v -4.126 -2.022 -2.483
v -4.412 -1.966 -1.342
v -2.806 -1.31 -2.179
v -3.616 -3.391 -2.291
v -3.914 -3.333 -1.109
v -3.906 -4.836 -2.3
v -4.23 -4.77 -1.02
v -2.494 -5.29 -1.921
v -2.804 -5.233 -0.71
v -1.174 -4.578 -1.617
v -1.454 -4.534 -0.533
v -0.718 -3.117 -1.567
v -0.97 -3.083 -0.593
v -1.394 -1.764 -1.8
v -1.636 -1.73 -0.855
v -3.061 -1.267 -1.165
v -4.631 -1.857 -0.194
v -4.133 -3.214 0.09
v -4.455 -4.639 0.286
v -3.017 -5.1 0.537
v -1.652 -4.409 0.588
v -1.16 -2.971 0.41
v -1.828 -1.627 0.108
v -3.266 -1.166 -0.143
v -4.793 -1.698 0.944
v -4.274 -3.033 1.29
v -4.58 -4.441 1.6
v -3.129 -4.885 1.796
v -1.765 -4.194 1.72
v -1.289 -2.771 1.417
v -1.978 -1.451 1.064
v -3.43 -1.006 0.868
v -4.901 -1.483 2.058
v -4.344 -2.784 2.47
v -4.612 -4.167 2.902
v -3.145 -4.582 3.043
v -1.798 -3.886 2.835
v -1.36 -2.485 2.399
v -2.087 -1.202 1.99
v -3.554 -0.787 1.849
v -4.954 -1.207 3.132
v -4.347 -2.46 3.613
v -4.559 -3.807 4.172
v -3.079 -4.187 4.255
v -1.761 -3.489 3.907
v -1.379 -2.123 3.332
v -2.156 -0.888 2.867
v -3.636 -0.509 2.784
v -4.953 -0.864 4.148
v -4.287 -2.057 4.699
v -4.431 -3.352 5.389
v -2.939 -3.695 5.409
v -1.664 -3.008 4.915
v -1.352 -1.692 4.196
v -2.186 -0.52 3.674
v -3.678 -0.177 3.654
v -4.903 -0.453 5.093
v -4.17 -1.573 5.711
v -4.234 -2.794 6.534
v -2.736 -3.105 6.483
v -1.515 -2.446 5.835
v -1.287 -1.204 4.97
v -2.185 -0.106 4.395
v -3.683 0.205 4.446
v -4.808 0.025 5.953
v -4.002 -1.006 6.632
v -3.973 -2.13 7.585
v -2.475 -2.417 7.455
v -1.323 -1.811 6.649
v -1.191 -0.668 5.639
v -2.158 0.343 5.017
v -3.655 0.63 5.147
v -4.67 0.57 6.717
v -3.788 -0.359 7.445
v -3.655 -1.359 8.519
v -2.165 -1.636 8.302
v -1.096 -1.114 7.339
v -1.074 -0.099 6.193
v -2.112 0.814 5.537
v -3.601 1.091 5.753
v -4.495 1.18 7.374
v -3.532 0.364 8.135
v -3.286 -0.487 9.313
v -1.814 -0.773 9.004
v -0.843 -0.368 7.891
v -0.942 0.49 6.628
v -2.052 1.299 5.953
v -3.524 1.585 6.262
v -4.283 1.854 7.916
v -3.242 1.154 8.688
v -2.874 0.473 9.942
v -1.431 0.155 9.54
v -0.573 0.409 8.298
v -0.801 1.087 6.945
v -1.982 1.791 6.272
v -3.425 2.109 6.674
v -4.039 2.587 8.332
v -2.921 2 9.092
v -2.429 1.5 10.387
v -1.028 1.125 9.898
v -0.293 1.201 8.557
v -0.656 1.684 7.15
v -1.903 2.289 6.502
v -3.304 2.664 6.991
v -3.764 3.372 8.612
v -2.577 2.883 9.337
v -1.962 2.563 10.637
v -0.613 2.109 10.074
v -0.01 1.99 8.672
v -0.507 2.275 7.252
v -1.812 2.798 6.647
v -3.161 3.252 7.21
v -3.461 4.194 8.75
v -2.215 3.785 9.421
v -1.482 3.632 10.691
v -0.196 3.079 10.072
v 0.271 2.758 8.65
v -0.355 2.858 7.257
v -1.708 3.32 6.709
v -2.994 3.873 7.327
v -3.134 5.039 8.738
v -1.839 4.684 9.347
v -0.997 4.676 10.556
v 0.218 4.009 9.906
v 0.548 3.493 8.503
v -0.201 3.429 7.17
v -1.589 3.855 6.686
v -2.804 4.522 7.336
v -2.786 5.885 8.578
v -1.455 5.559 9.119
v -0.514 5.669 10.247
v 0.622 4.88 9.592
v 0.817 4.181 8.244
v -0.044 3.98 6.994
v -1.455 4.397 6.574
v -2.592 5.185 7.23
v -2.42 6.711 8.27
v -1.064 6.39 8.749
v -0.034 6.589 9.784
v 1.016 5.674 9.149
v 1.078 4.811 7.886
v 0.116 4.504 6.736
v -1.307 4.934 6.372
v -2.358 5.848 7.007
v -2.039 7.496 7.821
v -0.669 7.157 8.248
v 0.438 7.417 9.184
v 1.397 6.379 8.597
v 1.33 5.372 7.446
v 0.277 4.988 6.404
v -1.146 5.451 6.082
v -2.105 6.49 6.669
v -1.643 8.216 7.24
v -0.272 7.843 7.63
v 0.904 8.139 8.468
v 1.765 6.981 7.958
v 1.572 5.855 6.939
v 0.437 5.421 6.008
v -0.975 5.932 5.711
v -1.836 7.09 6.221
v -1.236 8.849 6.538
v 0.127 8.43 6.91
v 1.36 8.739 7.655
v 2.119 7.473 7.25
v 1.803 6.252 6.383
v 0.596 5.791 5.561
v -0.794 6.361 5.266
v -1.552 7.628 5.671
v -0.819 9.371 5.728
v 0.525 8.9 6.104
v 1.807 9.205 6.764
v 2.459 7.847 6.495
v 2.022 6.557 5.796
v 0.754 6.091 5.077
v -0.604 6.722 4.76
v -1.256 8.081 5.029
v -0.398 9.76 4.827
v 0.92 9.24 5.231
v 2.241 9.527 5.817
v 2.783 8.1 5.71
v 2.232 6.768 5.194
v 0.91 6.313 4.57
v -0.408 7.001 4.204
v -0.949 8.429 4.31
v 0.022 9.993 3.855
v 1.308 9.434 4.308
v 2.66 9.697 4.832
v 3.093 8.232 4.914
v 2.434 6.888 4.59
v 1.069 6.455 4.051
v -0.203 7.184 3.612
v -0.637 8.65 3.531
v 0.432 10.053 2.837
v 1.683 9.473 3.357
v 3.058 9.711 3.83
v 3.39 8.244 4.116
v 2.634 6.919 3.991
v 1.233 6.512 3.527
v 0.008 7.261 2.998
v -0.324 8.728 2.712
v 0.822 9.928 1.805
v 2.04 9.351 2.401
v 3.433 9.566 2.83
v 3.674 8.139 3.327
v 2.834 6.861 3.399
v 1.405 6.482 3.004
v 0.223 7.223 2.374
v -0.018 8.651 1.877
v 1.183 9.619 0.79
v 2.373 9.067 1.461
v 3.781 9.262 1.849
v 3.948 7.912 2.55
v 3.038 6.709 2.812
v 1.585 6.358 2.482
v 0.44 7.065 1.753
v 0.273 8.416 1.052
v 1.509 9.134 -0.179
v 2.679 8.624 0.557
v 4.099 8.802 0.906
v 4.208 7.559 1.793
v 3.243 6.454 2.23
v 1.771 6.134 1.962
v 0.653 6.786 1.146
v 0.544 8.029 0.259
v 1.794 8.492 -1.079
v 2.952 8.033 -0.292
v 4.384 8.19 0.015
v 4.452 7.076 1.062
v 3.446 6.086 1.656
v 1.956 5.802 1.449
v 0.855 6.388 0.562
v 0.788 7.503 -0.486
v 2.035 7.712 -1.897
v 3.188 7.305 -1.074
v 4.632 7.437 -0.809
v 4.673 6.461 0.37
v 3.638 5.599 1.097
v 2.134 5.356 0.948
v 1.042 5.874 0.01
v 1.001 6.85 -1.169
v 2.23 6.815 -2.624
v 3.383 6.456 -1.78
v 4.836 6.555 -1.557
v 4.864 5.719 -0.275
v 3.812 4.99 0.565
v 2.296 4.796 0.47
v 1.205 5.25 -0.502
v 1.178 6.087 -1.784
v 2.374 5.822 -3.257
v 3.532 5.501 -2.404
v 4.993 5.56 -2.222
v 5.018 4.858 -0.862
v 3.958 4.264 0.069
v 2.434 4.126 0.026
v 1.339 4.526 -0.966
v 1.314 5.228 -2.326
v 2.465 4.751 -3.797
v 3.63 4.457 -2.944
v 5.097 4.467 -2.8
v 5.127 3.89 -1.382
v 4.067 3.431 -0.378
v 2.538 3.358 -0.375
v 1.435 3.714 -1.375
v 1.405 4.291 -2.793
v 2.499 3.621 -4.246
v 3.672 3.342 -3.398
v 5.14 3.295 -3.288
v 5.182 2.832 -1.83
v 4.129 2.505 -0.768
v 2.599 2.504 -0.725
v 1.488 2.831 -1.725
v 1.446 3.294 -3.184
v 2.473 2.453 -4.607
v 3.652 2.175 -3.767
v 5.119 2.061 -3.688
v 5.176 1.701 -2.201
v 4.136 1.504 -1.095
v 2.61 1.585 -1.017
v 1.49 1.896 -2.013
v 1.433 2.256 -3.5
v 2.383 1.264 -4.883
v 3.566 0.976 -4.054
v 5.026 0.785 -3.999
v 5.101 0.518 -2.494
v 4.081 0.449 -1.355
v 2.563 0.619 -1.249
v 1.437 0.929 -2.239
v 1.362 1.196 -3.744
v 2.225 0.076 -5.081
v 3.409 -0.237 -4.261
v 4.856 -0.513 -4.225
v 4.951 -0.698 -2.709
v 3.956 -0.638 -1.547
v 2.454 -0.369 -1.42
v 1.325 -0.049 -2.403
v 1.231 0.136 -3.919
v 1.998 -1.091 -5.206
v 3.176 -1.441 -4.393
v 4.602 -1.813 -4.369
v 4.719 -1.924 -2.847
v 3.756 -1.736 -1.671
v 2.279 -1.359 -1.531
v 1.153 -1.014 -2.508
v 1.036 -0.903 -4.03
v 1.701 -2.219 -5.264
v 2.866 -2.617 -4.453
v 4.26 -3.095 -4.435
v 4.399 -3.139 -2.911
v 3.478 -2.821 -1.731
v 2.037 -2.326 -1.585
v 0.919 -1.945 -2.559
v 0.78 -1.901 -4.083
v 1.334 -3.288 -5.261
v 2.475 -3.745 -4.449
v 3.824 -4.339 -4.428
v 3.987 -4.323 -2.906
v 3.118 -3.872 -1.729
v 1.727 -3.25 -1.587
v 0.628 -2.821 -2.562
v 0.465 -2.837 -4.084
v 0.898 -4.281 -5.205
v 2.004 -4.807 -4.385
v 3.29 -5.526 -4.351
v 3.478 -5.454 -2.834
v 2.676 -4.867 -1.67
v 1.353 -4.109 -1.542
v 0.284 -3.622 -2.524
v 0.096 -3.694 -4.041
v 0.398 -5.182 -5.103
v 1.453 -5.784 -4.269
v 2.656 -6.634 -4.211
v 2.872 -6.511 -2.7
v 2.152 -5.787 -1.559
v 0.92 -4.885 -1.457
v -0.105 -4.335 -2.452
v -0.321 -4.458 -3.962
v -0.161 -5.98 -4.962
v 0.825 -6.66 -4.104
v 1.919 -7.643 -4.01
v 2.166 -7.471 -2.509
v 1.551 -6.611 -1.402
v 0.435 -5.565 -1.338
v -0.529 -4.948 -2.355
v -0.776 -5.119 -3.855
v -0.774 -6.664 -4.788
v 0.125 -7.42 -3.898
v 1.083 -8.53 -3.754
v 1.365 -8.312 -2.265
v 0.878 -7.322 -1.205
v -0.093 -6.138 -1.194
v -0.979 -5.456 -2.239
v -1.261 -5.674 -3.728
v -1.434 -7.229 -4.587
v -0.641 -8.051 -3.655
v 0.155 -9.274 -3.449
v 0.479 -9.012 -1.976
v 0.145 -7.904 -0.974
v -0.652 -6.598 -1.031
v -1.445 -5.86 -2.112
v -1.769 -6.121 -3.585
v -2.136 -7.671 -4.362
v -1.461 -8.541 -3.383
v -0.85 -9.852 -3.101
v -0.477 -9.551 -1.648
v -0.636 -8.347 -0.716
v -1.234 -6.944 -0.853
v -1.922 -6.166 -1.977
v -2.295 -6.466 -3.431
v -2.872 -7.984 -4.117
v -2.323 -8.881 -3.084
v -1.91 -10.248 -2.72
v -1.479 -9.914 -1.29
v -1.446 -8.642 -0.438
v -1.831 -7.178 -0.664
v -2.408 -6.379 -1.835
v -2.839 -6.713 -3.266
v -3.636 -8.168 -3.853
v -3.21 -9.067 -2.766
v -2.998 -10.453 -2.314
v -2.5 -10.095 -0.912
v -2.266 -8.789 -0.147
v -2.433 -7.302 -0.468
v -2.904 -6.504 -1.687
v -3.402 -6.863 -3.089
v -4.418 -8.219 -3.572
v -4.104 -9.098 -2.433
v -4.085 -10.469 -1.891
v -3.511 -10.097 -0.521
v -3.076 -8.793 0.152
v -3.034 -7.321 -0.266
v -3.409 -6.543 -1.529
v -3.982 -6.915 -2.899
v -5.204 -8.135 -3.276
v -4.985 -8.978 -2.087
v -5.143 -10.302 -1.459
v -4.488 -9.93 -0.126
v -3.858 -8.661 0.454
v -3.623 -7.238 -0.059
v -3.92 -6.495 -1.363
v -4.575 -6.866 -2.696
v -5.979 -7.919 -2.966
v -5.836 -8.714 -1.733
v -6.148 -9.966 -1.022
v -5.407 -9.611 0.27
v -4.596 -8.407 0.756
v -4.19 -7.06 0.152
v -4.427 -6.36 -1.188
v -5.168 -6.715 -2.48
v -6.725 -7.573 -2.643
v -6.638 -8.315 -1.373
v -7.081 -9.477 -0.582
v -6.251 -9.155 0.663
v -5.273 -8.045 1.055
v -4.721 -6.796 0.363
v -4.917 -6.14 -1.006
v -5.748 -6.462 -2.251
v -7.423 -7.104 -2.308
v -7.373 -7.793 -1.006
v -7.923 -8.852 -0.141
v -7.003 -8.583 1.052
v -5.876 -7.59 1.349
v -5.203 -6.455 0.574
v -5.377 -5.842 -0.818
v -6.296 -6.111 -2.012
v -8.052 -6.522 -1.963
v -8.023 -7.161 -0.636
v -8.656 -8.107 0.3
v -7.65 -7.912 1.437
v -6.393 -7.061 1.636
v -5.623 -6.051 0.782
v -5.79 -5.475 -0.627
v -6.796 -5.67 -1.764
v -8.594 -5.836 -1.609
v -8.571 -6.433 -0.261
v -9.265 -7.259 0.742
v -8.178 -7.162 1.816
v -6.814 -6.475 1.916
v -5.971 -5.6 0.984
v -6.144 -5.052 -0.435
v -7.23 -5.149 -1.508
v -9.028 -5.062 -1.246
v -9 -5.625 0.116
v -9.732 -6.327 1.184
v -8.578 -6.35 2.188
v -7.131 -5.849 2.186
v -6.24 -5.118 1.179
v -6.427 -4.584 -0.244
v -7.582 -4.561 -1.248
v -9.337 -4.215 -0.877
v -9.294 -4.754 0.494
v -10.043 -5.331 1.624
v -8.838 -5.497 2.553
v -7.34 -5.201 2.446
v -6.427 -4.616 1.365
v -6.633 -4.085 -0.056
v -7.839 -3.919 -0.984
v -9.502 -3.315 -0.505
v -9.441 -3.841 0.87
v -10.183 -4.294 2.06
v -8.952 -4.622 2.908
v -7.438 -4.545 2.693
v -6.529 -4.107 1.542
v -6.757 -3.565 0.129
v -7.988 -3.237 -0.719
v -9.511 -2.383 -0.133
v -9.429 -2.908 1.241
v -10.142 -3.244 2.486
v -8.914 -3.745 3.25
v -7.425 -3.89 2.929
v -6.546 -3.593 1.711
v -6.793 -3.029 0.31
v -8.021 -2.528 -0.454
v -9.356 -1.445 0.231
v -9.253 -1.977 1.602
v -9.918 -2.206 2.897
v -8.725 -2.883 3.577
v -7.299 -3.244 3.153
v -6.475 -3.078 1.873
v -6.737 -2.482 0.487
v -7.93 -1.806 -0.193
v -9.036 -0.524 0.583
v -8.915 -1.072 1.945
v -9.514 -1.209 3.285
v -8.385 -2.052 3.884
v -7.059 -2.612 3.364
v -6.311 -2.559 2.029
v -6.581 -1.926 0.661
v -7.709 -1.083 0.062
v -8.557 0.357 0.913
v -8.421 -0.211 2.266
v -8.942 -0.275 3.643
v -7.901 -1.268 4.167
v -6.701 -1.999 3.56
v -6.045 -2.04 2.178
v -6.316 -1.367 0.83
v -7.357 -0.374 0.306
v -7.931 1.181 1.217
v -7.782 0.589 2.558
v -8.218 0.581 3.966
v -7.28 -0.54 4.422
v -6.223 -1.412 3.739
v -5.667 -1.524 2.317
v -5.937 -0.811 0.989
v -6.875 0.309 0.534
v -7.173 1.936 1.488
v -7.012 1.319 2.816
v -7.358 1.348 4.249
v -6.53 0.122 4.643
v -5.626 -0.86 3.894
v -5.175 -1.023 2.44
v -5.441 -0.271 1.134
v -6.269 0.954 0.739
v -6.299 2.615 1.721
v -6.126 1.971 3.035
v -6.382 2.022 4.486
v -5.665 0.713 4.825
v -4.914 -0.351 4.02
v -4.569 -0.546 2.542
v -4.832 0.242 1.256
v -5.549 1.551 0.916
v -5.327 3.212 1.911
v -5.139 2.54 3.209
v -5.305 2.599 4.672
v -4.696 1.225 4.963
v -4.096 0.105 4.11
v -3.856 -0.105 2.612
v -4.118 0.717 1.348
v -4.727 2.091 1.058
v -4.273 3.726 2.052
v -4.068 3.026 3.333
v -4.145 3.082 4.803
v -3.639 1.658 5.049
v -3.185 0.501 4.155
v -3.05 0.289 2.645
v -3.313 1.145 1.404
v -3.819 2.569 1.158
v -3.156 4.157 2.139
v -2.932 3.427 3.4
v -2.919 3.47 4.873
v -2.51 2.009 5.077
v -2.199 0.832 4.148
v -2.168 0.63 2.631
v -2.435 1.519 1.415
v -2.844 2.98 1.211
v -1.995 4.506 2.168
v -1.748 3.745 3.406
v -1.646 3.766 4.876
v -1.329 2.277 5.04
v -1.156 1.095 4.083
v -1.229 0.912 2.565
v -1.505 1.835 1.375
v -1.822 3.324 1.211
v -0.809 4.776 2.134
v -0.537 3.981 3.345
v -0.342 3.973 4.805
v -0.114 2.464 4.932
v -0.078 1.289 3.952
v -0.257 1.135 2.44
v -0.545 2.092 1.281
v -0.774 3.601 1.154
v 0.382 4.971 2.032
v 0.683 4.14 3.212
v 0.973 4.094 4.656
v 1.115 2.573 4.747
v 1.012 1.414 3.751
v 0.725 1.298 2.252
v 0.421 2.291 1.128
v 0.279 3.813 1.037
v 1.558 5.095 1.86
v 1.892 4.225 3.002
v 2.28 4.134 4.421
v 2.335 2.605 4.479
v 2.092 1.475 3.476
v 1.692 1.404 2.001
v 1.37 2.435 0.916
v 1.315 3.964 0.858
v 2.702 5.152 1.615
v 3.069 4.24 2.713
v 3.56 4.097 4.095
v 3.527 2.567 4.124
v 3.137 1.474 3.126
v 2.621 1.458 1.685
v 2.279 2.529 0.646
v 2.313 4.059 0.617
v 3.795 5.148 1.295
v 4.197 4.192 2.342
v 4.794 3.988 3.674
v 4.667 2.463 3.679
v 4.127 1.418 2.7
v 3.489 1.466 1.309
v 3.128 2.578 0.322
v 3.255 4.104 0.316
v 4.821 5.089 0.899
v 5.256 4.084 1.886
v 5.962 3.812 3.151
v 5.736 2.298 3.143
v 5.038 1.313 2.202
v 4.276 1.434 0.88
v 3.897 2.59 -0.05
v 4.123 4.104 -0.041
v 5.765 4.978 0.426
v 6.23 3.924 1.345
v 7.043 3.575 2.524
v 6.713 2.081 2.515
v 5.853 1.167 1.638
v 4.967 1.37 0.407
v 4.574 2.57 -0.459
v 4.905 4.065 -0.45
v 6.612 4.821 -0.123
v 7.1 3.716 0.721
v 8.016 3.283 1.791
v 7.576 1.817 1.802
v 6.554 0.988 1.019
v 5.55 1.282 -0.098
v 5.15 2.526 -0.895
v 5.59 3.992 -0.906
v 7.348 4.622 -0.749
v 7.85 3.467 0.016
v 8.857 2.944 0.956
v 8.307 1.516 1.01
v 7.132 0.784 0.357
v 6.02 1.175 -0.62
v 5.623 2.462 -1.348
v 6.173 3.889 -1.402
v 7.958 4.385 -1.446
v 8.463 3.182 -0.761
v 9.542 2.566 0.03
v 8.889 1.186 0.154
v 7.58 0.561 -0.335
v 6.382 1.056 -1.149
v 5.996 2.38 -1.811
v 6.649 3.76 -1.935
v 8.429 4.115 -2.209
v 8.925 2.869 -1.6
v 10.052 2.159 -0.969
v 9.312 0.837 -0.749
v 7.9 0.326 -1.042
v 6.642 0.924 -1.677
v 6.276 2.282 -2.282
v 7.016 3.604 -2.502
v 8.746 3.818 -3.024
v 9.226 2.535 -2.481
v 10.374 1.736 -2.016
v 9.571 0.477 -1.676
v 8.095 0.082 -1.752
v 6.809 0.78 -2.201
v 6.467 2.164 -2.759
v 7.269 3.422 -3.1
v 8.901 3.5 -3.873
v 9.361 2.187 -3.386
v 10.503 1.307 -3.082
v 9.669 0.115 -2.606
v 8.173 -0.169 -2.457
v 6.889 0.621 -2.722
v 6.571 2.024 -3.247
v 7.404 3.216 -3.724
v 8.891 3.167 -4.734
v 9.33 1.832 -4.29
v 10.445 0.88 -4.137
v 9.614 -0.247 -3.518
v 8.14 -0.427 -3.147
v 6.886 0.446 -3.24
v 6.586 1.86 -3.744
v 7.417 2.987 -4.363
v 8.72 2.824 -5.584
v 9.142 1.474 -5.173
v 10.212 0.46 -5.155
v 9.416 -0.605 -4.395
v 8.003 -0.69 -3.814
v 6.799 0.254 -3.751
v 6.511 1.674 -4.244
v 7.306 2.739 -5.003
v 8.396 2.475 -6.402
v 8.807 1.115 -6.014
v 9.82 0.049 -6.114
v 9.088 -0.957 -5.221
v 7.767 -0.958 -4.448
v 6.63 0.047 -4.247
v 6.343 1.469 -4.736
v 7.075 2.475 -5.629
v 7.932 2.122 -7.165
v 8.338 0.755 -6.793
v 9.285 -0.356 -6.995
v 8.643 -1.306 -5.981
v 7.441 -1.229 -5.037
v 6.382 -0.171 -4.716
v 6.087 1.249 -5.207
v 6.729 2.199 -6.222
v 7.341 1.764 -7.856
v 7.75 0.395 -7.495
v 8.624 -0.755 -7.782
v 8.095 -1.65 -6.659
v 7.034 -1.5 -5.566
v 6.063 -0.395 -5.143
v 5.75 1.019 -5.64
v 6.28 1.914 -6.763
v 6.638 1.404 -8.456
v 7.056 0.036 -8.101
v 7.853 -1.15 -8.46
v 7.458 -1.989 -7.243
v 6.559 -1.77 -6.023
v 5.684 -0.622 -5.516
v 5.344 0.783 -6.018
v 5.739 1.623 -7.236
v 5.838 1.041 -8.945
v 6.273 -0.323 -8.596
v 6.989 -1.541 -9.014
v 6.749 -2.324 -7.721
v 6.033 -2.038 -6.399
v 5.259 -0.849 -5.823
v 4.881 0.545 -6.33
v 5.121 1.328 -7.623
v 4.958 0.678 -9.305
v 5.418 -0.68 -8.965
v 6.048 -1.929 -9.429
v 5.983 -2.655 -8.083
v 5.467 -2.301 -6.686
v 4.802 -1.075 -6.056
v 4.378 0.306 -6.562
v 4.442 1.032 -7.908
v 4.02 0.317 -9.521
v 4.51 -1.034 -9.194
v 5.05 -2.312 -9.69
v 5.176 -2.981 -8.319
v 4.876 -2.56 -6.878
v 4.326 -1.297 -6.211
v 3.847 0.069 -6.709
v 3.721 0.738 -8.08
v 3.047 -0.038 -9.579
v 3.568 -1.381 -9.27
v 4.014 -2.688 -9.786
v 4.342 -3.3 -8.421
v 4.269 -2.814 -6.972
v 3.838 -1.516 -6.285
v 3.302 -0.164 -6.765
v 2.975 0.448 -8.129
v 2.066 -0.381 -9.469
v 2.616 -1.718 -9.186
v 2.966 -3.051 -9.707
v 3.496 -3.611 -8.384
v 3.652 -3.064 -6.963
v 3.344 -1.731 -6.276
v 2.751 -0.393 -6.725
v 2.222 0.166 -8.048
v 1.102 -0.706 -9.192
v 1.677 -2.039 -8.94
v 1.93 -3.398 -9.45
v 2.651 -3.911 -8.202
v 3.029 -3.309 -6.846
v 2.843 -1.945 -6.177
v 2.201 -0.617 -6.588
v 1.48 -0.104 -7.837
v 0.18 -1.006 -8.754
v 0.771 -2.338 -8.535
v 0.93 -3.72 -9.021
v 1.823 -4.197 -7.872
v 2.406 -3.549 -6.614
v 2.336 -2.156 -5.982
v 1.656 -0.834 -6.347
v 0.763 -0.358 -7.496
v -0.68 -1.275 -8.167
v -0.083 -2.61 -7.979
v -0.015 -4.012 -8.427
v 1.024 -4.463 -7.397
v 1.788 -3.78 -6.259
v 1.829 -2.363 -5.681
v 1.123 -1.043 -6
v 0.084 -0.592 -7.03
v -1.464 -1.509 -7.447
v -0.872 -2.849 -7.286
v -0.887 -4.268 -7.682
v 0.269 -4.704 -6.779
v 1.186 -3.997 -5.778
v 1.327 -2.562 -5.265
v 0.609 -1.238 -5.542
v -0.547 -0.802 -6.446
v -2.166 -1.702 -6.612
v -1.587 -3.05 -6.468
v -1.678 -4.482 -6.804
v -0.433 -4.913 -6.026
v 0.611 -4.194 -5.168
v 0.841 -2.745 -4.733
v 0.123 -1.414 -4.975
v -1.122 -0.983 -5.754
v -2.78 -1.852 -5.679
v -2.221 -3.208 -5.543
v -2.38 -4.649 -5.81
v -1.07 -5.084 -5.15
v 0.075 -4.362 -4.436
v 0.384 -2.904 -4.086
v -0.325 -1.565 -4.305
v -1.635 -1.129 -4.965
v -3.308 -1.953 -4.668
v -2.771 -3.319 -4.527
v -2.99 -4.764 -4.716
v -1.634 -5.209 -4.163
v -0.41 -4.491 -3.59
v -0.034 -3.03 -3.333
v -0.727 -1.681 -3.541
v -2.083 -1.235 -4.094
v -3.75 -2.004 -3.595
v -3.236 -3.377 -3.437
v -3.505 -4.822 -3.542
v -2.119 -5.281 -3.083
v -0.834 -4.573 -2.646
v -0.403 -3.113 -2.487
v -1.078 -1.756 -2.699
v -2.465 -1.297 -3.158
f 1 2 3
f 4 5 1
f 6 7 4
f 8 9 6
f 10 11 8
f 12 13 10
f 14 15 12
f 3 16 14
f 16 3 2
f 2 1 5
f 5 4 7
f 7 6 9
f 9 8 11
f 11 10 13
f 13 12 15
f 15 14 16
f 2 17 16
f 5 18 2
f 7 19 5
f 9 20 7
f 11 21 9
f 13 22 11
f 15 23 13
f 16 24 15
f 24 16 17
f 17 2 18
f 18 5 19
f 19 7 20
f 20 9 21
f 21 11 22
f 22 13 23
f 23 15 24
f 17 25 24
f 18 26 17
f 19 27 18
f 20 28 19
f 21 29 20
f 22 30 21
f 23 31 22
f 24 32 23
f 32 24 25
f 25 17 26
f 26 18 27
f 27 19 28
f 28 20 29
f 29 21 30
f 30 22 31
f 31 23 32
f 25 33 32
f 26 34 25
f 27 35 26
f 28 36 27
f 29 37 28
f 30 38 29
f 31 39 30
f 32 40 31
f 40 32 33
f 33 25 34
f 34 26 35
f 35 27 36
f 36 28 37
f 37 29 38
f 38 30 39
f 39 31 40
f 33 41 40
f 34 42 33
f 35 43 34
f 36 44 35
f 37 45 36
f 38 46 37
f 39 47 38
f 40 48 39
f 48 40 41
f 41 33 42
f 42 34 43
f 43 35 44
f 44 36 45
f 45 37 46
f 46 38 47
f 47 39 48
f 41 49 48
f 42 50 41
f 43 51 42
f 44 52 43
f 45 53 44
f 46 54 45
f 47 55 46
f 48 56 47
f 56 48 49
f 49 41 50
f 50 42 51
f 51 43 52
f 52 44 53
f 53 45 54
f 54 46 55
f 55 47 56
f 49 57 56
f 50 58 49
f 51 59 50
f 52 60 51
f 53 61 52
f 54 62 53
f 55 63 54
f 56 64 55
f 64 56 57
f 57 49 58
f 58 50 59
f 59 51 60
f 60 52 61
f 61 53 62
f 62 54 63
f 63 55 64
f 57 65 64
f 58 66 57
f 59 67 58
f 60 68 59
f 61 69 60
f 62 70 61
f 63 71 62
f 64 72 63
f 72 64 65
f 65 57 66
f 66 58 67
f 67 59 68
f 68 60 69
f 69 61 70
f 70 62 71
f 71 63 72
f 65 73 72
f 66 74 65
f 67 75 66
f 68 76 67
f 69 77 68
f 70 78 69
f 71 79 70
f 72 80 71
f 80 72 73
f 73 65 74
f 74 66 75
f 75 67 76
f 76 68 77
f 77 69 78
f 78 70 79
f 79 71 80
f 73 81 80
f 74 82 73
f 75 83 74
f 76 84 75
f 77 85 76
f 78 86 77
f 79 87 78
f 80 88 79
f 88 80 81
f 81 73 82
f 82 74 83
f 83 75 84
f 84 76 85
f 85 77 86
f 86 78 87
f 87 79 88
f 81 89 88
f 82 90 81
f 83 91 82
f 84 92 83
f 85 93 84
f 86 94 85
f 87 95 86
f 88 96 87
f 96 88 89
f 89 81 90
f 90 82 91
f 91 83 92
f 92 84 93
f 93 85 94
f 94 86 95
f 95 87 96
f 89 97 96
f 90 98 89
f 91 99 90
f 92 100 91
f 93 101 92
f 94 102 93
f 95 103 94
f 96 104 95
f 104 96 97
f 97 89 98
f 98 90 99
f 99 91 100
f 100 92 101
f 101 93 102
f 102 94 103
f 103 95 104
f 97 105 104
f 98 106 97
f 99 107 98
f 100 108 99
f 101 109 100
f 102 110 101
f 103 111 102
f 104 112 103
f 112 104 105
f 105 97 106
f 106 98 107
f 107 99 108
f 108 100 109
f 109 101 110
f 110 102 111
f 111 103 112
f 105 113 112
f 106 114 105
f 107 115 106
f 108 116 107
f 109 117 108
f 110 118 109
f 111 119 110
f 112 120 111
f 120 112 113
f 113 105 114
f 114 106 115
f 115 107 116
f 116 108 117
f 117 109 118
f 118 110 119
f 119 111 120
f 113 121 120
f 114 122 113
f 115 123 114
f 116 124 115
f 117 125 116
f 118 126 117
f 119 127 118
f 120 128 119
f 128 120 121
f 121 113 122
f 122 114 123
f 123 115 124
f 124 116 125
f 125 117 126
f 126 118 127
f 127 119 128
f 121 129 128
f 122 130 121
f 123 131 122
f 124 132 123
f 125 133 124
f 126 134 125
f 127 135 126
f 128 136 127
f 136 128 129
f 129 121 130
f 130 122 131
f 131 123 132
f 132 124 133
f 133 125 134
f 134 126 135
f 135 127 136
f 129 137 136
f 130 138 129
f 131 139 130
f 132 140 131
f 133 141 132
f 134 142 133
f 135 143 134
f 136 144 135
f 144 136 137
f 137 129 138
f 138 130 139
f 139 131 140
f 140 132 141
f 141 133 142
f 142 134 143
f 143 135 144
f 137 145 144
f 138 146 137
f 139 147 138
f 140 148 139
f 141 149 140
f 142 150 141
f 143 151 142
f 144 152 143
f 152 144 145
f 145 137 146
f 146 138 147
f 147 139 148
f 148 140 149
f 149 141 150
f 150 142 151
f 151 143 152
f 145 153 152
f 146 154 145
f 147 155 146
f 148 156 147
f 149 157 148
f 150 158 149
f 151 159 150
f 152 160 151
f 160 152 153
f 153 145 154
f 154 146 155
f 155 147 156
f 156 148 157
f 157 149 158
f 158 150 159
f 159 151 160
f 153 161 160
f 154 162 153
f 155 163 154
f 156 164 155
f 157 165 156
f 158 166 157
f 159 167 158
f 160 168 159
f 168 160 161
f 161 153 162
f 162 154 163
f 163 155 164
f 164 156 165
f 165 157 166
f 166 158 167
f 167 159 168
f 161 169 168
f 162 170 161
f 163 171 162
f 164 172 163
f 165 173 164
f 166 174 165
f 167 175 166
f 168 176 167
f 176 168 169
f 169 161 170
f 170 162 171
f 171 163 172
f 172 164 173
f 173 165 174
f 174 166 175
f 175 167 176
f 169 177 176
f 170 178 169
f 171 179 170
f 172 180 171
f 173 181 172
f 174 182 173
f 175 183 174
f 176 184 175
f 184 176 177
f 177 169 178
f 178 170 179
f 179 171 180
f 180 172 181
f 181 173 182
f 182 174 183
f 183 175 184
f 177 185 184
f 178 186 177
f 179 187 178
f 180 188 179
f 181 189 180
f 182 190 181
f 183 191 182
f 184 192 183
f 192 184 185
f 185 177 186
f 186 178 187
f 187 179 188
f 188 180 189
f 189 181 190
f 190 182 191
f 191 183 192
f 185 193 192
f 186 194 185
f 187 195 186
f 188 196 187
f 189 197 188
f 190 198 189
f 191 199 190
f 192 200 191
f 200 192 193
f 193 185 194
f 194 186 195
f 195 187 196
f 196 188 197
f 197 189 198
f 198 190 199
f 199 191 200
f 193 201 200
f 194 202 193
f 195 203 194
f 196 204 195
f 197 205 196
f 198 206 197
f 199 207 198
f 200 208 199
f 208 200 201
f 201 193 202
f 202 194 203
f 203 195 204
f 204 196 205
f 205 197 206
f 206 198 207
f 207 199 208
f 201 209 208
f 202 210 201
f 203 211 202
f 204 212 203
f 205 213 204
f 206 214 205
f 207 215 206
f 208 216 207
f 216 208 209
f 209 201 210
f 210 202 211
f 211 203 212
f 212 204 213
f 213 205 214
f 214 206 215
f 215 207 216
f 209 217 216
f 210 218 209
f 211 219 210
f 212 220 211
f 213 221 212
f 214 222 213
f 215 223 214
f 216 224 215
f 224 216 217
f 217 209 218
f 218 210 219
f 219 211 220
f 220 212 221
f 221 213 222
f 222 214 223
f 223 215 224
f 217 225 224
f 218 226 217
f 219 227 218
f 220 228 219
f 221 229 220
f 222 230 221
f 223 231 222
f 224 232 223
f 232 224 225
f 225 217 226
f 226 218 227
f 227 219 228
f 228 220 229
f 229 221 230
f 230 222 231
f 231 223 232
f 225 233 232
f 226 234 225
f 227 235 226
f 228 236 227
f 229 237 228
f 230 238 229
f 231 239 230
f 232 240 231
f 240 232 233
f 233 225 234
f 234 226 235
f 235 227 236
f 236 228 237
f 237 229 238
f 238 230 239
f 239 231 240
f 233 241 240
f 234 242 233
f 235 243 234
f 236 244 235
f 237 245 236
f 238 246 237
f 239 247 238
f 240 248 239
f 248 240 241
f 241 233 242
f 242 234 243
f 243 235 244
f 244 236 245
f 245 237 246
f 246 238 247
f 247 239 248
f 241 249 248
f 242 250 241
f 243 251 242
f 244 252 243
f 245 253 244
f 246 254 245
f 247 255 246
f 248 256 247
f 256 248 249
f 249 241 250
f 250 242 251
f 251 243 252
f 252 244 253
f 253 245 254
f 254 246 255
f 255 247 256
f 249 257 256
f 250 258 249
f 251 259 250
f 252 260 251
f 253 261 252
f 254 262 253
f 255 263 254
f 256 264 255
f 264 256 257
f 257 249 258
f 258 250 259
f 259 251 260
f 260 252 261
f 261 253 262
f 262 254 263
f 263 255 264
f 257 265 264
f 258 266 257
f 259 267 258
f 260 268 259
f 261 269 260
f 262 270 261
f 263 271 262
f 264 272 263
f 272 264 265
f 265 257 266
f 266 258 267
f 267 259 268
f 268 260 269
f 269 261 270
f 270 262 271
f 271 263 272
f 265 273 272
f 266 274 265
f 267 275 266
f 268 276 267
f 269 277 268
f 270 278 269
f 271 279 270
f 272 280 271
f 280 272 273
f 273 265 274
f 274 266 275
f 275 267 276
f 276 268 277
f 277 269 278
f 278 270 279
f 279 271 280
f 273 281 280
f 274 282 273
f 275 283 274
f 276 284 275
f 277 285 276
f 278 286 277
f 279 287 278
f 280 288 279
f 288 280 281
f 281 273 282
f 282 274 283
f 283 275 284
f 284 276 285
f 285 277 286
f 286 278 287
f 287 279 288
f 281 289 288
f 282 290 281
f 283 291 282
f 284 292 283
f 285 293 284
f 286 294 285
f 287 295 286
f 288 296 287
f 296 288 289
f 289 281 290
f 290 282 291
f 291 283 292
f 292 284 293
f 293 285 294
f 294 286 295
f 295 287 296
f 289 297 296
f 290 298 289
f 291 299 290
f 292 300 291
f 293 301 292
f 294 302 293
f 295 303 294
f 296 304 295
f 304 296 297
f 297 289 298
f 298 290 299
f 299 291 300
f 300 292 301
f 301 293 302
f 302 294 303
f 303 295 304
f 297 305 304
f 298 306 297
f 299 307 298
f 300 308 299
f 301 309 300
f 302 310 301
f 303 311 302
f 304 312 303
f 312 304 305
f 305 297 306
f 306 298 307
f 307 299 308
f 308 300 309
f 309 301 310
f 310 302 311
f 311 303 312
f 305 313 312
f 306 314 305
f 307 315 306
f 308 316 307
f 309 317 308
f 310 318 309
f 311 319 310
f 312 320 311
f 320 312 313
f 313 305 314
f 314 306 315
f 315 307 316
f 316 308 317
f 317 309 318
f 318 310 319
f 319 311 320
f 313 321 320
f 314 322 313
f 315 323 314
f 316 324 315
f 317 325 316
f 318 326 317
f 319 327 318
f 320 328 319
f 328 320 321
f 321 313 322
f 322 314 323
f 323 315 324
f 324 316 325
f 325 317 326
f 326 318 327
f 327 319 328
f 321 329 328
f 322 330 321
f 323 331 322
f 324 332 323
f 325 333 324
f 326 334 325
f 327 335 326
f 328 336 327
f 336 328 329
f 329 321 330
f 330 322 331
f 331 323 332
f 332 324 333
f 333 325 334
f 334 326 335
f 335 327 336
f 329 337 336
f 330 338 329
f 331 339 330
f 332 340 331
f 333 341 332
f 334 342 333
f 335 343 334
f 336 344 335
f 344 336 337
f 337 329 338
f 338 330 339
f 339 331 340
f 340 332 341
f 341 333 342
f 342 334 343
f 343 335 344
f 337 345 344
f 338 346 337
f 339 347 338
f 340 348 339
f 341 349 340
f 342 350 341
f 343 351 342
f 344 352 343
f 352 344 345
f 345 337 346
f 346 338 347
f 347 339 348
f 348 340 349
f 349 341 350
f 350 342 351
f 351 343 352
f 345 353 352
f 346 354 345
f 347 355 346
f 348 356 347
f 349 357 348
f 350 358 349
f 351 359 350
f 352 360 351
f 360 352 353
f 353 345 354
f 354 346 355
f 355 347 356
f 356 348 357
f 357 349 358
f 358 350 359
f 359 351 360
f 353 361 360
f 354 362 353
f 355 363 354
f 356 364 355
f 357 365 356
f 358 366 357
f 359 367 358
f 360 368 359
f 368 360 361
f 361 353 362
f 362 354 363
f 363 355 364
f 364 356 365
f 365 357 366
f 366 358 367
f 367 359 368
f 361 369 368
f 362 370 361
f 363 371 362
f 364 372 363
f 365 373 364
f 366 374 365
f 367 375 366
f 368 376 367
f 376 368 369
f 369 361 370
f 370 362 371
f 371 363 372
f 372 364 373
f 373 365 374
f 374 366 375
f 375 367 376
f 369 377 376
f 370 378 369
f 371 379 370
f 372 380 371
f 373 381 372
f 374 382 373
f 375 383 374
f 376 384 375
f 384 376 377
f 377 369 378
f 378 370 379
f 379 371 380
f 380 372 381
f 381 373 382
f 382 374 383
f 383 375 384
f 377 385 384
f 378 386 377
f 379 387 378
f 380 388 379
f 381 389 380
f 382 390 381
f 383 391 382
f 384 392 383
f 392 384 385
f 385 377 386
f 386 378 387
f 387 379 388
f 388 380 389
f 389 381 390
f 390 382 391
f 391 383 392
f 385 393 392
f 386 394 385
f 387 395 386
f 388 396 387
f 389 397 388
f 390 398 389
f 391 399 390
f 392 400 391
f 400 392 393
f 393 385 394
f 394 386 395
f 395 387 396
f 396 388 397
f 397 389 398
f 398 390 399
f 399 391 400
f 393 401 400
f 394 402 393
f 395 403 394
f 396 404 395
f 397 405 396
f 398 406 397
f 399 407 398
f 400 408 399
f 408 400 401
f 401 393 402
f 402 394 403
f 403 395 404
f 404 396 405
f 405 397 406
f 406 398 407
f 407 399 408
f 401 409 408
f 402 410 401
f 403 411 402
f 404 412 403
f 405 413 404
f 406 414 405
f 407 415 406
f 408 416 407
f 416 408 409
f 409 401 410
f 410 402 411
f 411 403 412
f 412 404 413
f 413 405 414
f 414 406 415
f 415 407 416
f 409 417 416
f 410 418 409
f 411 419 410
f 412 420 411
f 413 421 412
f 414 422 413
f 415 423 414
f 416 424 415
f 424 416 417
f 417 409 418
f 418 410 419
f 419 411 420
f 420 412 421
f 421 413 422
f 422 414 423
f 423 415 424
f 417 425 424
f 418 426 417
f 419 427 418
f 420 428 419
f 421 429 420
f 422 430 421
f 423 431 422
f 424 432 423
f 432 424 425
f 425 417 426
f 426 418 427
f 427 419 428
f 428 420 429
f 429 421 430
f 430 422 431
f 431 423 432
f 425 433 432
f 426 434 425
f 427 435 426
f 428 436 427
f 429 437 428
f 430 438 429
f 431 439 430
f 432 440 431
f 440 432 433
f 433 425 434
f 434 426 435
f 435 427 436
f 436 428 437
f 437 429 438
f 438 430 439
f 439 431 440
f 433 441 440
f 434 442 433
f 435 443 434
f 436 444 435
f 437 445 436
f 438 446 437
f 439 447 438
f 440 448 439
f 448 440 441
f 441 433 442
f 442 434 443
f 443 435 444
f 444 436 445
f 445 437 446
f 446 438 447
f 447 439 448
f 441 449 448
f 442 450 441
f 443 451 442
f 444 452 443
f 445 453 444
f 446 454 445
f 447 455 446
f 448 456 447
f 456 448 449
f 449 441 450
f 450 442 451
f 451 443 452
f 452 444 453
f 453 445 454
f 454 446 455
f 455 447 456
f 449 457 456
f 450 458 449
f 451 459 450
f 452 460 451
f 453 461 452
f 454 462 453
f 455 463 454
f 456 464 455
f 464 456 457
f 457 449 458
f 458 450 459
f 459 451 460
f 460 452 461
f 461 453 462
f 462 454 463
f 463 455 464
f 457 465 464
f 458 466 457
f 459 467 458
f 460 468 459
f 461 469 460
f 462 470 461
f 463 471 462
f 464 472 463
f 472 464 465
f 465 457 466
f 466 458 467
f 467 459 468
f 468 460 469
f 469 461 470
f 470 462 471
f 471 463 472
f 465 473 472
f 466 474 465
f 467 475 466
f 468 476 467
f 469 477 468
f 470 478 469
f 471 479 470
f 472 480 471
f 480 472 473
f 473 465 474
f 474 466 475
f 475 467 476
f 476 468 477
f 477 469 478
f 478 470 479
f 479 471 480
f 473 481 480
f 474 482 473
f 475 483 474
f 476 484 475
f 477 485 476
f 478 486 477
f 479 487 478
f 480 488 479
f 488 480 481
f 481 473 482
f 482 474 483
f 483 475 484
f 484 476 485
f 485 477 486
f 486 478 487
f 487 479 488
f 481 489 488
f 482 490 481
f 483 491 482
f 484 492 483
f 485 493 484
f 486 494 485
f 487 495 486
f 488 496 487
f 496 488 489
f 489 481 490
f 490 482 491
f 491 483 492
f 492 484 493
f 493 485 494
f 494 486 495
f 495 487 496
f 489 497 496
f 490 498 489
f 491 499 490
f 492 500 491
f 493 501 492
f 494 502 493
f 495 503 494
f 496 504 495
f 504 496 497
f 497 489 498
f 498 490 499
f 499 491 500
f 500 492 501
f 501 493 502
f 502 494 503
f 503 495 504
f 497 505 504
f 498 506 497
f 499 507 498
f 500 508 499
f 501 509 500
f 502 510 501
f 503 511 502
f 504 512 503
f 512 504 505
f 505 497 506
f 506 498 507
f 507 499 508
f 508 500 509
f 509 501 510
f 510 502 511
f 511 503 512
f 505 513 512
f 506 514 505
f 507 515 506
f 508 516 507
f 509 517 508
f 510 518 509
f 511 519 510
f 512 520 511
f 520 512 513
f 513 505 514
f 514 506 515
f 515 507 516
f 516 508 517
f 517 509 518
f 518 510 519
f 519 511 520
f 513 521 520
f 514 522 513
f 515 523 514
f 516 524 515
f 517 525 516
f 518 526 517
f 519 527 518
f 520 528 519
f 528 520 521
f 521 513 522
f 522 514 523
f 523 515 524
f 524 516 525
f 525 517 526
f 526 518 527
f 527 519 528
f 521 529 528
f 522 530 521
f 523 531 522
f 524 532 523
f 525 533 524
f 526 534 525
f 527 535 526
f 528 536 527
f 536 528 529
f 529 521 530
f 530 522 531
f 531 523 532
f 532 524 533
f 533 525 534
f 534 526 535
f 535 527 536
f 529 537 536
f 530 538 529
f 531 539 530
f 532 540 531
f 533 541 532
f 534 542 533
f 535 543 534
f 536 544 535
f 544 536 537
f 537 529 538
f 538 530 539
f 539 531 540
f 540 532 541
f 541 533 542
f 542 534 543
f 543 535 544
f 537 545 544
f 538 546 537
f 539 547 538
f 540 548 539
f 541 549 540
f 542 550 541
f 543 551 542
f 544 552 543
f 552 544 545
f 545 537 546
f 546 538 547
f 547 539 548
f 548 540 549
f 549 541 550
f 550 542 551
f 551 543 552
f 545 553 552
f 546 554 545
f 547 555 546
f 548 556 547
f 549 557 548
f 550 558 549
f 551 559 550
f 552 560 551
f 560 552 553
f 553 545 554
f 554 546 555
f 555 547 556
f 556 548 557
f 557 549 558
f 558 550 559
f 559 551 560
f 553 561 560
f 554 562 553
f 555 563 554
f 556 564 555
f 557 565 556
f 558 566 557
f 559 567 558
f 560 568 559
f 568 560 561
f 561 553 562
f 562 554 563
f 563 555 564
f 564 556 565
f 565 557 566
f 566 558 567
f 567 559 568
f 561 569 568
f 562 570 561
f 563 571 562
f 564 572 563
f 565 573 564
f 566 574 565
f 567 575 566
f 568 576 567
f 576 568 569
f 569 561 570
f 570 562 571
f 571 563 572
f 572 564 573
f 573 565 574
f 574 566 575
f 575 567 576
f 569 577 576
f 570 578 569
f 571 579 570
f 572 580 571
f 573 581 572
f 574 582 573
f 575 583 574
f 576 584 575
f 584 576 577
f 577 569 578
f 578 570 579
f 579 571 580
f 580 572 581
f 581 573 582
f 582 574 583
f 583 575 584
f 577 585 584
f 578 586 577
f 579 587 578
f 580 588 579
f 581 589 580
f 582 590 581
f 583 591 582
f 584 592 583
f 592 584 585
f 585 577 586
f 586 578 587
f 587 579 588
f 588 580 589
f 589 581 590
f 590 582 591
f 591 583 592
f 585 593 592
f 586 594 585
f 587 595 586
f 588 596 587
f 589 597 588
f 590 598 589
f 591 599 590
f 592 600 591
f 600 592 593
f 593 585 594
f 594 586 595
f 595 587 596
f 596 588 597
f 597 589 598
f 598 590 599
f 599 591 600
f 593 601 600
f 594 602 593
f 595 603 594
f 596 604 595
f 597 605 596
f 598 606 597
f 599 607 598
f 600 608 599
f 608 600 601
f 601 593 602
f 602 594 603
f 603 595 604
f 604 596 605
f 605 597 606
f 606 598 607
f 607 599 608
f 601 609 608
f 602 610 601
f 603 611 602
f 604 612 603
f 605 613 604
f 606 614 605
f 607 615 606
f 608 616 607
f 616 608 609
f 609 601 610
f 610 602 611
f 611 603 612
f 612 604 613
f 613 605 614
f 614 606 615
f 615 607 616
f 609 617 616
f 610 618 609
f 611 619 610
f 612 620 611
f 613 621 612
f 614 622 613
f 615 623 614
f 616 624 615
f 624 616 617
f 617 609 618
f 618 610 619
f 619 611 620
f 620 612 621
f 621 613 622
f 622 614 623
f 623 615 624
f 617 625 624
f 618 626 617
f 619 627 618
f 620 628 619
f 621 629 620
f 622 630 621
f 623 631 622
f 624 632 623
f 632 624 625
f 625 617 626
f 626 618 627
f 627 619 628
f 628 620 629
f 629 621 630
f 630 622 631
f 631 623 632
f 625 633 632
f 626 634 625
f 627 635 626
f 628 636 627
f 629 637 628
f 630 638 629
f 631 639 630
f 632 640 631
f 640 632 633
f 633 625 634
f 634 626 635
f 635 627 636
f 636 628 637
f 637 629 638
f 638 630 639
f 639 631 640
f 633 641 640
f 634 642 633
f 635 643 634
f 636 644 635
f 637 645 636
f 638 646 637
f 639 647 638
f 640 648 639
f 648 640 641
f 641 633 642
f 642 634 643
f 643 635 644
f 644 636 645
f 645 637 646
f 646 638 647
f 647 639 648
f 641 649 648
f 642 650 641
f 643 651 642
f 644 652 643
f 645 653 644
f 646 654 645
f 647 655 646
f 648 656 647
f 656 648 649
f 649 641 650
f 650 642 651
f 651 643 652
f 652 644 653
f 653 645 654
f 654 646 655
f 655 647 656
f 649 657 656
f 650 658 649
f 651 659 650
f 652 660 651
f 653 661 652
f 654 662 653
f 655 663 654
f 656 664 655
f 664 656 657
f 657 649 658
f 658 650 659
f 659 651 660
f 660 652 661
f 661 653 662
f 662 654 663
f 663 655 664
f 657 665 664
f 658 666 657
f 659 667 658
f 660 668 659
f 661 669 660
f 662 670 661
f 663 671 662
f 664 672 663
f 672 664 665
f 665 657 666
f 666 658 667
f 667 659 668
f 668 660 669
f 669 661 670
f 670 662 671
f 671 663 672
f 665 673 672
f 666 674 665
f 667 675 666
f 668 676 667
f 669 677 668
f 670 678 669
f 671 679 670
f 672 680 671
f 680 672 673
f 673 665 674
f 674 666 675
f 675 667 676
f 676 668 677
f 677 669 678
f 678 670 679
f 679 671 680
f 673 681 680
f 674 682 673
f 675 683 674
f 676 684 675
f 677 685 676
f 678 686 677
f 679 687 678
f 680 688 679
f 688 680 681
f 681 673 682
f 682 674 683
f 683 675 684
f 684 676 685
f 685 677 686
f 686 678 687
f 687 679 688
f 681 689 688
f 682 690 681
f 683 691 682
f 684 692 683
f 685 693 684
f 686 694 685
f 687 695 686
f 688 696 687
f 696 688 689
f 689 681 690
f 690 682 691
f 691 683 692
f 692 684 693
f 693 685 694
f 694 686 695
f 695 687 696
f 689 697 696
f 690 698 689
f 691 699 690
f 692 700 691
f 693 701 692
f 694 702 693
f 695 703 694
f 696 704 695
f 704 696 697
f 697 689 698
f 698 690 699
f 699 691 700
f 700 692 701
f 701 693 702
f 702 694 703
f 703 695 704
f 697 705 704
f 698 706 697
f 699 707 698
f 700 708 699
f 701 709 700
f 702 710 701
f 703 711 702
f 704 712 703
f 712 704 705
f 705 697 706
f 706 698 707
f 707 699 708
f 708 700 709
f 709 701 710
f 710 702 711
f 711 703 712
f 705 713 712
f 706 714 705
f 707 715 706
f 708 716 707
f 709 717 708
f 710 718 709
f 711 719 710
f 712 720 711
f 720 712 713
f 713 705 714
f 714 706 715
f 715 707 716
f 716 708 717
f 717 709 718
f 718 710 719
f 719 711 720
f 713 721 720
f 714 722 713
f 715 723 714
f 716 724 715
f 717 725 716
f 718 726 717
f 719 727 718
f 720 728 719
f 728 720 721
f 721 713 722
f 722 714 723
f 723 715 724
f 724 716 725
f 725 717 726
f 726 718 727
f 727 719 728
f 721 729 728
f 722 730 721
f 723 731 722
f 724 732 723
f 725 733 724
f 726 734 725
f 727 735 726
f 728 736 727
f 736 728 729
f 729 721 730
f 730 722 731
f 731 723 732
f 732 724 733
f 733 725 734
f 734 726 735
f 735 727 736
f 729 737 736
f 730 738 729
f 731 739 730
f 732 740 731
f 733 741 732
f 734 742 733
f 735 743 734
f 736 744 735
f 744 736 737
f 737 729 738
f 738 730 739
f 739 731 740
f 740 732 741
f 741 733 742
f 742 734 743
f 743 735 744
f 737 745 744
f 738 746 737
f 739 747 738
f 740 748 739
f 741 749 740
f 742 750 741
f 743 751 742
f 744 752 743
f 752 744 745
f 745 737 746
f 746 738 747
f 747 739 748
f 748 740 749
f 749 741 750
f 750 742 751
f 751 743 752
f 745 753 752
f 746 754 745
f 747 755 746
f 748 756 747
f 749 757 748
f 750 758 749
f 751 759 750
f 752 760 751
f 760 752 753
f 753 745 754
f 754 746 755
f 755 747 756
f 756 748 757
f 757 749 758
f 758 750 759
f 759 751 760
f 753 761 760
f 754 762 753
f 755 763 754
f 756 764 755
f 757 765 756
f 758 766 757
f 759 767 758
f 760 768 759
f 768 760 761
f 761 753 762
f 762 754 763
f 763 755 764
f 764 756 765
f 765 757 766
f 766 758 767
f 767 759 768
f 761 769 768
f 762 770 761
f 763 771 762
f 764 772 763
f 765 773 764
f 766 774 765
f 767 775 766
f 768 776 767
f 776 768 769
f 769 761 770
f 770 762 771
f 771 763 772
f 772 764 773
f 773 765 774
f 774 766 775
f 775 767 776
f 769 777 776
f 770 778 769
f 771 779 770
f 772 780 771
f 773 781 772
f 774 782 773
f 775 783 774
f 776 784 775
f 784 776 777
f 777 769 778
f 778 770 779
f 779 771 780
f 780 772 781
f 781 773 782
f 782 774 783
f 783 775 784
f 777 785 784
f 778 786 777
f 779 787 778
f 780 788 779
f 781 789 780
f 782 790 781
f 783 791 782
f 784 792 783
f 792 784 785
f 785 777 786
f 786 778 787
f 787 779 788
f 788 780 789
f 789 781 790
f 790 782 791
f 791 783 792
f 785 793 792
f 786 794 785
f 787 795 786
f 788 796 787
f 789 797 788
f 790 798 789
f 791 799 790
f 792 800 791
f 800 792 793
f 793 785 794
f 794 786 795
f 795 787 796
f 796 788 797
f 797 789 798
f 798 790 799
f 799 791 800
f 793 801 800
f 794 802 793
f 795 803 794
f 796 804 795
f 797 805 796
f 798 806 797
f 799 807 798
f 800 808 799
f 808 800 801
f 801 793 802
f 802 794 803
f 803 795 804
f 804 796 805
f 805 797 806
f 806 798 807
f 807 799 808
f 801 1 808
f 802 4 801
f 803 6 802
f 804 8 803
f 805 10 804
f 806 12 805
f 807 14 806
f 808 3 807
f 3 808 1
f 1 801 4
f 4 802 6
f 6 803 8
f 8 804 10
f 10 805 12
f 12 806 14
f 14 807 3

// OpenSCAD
//  path_extrude.scad -- Extrude a path in 3D space
//  usage: add "use <path_extrude.scad>;" to the top of your OpenSCAD source code

//  Copyright (C) 2014-2019  David Eccles (gringer) <bioinformatics@gringene.org>

//  This program is free software: you can redistribute it and/or modify
//  it under the terms of the GNU General Public License as published by
//  the Free Software Foundation, either version 3 of the License, or
//  (at your option) any later version.

//  This program is distributed in the hope that it will be useful,
//  but WITHOUT ANY WARRANTY; without even the implied warranty of
//  MERCHANTABILITY or FITNESS FOR A PARTICULAR PURPOSE.  See the
//  GNU General Public License for more details.

//  You should have received a copy of the GNU General Public License
//  along with this program.  If not, see <https://www.gnu.org/licenses/>.

// Determine the projection of a point on a plane centered at c1 with normal n1
function project(p, c, n) =
    p - (n * (p - c)) * n / (n * n);

// determine angle between two points with a given normal orientation
// see https://stackoverflow.com/questions/14066933/
//        direct-way-of-computing-clockwise-angle-between-2-vectors
//    dot = p1 * p2;
//    det = (p1[0]*p2[1]*n1[2] + p2[0]*n1[1]*p1[2] + n1[0]*p1[1]*p2[2]) -
//          (n1[0]*p2[1]*p1[2] + p1[0]*n1[1]*p2[2] + p2[0]*p1[1]*n1[2]);
//    atan2(det, dot);
// determine angle between two planar points and a centre
// with a given normal orientation
function getPlanarAngle(p1, p2, c1, n1) =
    let(p1 = p1-c1, n1=n1 / norm(n1), p2=p2-c1)
    atan2((p1[0]*p2[1]*n1[2] + p2[0]*n1[1]*p1[2] + n1[0]*p1[1]*p2[2]) -
          (n1[0]*p2[1]*p1[2] + p1[0]*n1[1]*p2[2] + p2[0]*p1[1]*n1[2]), p1 * p2);

function c3D(tPoints) =
    (len(tPoints[0]) == undef) ? // single point
        c3D([tPoints])[0] :
        (len(tPoints[0]) < 3) ?  // collection of 2D points
            tPoints * [[1,0,0],[0,1,0]] :
            tPoints;             // 3D points

// translate a point (or points)
function myTranslate(ofs, points, acc = []) =
    (len(points[0]) == undef) ?
        myTranslate(ofs, [points])[0] :
        [ for(i = [0:(len(points) - 1)])
          [ for(d = [0:(len(points[0])-1)]) (ofs[d] + points[i][d])]];

// rotate a point (or points)
function myRotate(rotVec, points) =
    let(rotX = [[1,              0,               0],
                [0, cos(rotVec[0]), -sin(rotVec[0])],
                [0, sin(rotVec[0]),  cos(rotVec[0])]],
        rotY = [[ cos(rotVec[1]), 0,-sin(rotVec[1])],
                [              0, 1,              0],
                [ sin(rotVec[1]), 0, cos(rotVec[1])]],
        rotZ = [[ cos(rotVec[2]), sin(rotVec[2]), 0],
                [ sin(rotVec[2]), -cos(rotVec[2]), 0],
                [0,              0,               1]])
    (len(points[0]) == undef) ?
        myRotate(rotVec, [points])[0] :
        c3D(points) * rotX * rotY * rotZ;

// Determine spherical rotation for cartesian coordinates
function rToS(pt) =
    [-acos((pt[2]) / norm(pt)),
         0,
         -atan2(pt[0],pt[1])];

function calcPreRot(p1, p2, p3) =
  let(n1=p2-p1, // normal between the two points (i.e. the plane that the polygon sits on)
      n2=p3-p2,
      rt1=rToS(n1),
      rt2=rToS(n2),
      pj1=(p2 + myRotate(rt2, [[2,0,0.5]])[0]),
      pj2=project(p=(p1 + myRotate(rt1, [[2,0,0.5]])[0]), c=p2, n=n2))
  getPlanarAngle(p1=pj1, p2=pj2, c1=p2, n1=n2);

function cumSum(x, res=[]) =
  (len(x) == len(res)) ? concat([0], res) :
    (len(res) == 0) ? cumSum(x=x, res=[x[0]]) :
        cumSum(x=x, res=concat(res, [x[len(res)] + res[len(res)-1]]));

// Create extrusion side panels for one polygon segment as triangles.
// Note: panels are not necessarily be planar due to path twists
function makeSides(shs, pts, ofs=0) =
  concat(
    [for(i=[0:(shs-1)]) [i+ofs, ((i+1) % shs + ofs + shs) % (shs * pts),
                         (i+1) % shs + ofs]],
    [for(i=[0:(shs-1)]) [((i+1) % shs + ofs + shs) % (shs * pts),
                         i+ofs, (i + ofs + shs) % (shs * pts)]]);

// Concatenate the contents of the outermost list
function flatten(A, acc = [], aDone = 0) =
    (aDone >= len(A)) ? acc :
       flatten(A, acc=concat(acc, A[aDone]), aDone = aDone + 1);

// Linearly interpolate between two shapes
function makeTween(shape1, shape2, t) =
    (t == 0) ? shape1 :
      (t == 1) ? shape2 :
        [for (i=[0:(len(shape1)-1)])
          (shape1[i]*(1-t) + shape2[i % len(shape2)]*(t))];

// Extrude a 2D shape through a 3D path
// Note: merge has two effects:
//   1) Removes end caps
//   2) Adjusts the rotation of each path point
//      so that the end and start match up
module path_extrude(exPath, exShape, exShape2=[],
    exRots = [0], exScale = [1], merge=false){
  echo(len(exShape2));
  exShapeTween = (len(exShape2) == 0) ?
    exShape : exShape2;
  shs = len(exShape); // shs: shape size
  pts = len(exPath);  // pts: path size
  exPathX = (merge) ? concat(exPath, [exPath[0], exPath[1]]) :
      concat(exPath,
            [exPath[pts-1] + (exPath[pts-1] - exPath[pts-2]),
             exPath[pts-1] + 2*(exPath[pts-1] - exPath[pts-2])]);
  exScaleX = (len(exScale) == len(exPath)) ? exScale :
      [for (i = [0:(pts-1)]) exScale[i % len(exScale)]];
  preRots = [for(i = [0:(pts-1)])
    calcPreRot(p1=exPathX[i], // "current" point on the path
               p2=exPathX[(i+1)], // "next" point on the path
               p3=exPathX[(i+2)]) ];
  cumPreRots = cumSum(preRots);
  seDiff = cumPreRots[len(cumPreRots)-1]; // rotation difference (start - end)
  // rotation adjustment to get start to look like end
  seAdj = -seDiff / (len(cumPreRots));
  adjPreRots = (!merge) ? cumPreRots :
    [for(i = [0:(pts-1)]) (cumPreRots[i] + seAdj * i)];
  adjExRots = (len(exRots) == 1) ?
    [for(i = [0:(len(adjPreRots)-1)]) (adjPreRots[i] + exRots[0])] :
    [for(i = [0:(len(adjPreRots)-1)]) (adjPreRots[i] + exRots[i % len(exRots)])];
  phPoints = flatten([
    for(i = [0:(pts-1)])
      let(p1=exPathX[i],
          p2=exPathX[(i+1)],
          n1=p2-p1, // normal between the two points
          rt1=rToS(n1))
      myTranslate(p1, myRotate(rt1, myRotate([0,0,-adjExRots[i]],
                  c3D(makeTween(exShape, exShapeTween, i / (pts-1)) * exScaleX[i]))))
    ]);
  if(merge){ // just the surface, no end caps
      polyhedron(points=phPoints,
        faces=flatten([
              for(i = [0:(pts-1)])
                makeSides(shs, pts, ofs=shs*i)
              ])
          );
  } else {
      polyhedron(points=phPoints,
        faces=concat(
            flatten([
              for(i = [0:(pts-2)])
                makeSides(shs, pts, ofs=shs*i)
              ]),
            concat( // add in start / end covers
              [[for(i= [0:(shs-1)]) i]],
              [[for(i= [(len(phPoints)-1):-1:(len(phPoints)-shs)]) i]]
            )
          ));
  }
}

myPathTrefoil = [ for(t = [0:(360 / 101):359]) [ // trefoil knot
    5*(.41*cos(t) - .18*sin(t) - .83*cos(2*t) - .83*sin(2*t) -
       .11*cos(3*t) + .27*sin(3*t)),
    5*(.36*cos(t) + .27*sin(t) - 1.13*cos(2*t) + .30*sin(2*t) +
       .11*cos(3*t) - .27*sin(3*t)),
    5*(.45*sin(t) - .30*cos(2*t) +1.13*sin(2*t) -
       .11*cos(3*t) + .27*sin(3*t))] ];

myPointsOctagon =
  let(ofs1=15)
  [ for(t = [0:(360/8):359])
     ((t==90)?1:2) * [cos(t+ofs1),sin(t+ofs1)]];
myPointsChunkOctagon =
  let(ofs1=15)
  [ for(t = [0:(360/8):359])
    ((t==90)?0.4:1.9) *
     [cos((t * 135/360 + 45)+ofs1+45)+0.5,sin((t * 135/360 + 45)+ofs1+45)]];
//myPoints = [ for(t = [0:(360/8):359]) 2 * [cos(t+45),sin(t+45)]];

pts=[2,0,0.5];

translate([0,0,0]) {
    path_extrude(exRots = [$t*360], exShape=myPointsOctagon,
                 exPath=myPathTrefoil, merge=true);
}
